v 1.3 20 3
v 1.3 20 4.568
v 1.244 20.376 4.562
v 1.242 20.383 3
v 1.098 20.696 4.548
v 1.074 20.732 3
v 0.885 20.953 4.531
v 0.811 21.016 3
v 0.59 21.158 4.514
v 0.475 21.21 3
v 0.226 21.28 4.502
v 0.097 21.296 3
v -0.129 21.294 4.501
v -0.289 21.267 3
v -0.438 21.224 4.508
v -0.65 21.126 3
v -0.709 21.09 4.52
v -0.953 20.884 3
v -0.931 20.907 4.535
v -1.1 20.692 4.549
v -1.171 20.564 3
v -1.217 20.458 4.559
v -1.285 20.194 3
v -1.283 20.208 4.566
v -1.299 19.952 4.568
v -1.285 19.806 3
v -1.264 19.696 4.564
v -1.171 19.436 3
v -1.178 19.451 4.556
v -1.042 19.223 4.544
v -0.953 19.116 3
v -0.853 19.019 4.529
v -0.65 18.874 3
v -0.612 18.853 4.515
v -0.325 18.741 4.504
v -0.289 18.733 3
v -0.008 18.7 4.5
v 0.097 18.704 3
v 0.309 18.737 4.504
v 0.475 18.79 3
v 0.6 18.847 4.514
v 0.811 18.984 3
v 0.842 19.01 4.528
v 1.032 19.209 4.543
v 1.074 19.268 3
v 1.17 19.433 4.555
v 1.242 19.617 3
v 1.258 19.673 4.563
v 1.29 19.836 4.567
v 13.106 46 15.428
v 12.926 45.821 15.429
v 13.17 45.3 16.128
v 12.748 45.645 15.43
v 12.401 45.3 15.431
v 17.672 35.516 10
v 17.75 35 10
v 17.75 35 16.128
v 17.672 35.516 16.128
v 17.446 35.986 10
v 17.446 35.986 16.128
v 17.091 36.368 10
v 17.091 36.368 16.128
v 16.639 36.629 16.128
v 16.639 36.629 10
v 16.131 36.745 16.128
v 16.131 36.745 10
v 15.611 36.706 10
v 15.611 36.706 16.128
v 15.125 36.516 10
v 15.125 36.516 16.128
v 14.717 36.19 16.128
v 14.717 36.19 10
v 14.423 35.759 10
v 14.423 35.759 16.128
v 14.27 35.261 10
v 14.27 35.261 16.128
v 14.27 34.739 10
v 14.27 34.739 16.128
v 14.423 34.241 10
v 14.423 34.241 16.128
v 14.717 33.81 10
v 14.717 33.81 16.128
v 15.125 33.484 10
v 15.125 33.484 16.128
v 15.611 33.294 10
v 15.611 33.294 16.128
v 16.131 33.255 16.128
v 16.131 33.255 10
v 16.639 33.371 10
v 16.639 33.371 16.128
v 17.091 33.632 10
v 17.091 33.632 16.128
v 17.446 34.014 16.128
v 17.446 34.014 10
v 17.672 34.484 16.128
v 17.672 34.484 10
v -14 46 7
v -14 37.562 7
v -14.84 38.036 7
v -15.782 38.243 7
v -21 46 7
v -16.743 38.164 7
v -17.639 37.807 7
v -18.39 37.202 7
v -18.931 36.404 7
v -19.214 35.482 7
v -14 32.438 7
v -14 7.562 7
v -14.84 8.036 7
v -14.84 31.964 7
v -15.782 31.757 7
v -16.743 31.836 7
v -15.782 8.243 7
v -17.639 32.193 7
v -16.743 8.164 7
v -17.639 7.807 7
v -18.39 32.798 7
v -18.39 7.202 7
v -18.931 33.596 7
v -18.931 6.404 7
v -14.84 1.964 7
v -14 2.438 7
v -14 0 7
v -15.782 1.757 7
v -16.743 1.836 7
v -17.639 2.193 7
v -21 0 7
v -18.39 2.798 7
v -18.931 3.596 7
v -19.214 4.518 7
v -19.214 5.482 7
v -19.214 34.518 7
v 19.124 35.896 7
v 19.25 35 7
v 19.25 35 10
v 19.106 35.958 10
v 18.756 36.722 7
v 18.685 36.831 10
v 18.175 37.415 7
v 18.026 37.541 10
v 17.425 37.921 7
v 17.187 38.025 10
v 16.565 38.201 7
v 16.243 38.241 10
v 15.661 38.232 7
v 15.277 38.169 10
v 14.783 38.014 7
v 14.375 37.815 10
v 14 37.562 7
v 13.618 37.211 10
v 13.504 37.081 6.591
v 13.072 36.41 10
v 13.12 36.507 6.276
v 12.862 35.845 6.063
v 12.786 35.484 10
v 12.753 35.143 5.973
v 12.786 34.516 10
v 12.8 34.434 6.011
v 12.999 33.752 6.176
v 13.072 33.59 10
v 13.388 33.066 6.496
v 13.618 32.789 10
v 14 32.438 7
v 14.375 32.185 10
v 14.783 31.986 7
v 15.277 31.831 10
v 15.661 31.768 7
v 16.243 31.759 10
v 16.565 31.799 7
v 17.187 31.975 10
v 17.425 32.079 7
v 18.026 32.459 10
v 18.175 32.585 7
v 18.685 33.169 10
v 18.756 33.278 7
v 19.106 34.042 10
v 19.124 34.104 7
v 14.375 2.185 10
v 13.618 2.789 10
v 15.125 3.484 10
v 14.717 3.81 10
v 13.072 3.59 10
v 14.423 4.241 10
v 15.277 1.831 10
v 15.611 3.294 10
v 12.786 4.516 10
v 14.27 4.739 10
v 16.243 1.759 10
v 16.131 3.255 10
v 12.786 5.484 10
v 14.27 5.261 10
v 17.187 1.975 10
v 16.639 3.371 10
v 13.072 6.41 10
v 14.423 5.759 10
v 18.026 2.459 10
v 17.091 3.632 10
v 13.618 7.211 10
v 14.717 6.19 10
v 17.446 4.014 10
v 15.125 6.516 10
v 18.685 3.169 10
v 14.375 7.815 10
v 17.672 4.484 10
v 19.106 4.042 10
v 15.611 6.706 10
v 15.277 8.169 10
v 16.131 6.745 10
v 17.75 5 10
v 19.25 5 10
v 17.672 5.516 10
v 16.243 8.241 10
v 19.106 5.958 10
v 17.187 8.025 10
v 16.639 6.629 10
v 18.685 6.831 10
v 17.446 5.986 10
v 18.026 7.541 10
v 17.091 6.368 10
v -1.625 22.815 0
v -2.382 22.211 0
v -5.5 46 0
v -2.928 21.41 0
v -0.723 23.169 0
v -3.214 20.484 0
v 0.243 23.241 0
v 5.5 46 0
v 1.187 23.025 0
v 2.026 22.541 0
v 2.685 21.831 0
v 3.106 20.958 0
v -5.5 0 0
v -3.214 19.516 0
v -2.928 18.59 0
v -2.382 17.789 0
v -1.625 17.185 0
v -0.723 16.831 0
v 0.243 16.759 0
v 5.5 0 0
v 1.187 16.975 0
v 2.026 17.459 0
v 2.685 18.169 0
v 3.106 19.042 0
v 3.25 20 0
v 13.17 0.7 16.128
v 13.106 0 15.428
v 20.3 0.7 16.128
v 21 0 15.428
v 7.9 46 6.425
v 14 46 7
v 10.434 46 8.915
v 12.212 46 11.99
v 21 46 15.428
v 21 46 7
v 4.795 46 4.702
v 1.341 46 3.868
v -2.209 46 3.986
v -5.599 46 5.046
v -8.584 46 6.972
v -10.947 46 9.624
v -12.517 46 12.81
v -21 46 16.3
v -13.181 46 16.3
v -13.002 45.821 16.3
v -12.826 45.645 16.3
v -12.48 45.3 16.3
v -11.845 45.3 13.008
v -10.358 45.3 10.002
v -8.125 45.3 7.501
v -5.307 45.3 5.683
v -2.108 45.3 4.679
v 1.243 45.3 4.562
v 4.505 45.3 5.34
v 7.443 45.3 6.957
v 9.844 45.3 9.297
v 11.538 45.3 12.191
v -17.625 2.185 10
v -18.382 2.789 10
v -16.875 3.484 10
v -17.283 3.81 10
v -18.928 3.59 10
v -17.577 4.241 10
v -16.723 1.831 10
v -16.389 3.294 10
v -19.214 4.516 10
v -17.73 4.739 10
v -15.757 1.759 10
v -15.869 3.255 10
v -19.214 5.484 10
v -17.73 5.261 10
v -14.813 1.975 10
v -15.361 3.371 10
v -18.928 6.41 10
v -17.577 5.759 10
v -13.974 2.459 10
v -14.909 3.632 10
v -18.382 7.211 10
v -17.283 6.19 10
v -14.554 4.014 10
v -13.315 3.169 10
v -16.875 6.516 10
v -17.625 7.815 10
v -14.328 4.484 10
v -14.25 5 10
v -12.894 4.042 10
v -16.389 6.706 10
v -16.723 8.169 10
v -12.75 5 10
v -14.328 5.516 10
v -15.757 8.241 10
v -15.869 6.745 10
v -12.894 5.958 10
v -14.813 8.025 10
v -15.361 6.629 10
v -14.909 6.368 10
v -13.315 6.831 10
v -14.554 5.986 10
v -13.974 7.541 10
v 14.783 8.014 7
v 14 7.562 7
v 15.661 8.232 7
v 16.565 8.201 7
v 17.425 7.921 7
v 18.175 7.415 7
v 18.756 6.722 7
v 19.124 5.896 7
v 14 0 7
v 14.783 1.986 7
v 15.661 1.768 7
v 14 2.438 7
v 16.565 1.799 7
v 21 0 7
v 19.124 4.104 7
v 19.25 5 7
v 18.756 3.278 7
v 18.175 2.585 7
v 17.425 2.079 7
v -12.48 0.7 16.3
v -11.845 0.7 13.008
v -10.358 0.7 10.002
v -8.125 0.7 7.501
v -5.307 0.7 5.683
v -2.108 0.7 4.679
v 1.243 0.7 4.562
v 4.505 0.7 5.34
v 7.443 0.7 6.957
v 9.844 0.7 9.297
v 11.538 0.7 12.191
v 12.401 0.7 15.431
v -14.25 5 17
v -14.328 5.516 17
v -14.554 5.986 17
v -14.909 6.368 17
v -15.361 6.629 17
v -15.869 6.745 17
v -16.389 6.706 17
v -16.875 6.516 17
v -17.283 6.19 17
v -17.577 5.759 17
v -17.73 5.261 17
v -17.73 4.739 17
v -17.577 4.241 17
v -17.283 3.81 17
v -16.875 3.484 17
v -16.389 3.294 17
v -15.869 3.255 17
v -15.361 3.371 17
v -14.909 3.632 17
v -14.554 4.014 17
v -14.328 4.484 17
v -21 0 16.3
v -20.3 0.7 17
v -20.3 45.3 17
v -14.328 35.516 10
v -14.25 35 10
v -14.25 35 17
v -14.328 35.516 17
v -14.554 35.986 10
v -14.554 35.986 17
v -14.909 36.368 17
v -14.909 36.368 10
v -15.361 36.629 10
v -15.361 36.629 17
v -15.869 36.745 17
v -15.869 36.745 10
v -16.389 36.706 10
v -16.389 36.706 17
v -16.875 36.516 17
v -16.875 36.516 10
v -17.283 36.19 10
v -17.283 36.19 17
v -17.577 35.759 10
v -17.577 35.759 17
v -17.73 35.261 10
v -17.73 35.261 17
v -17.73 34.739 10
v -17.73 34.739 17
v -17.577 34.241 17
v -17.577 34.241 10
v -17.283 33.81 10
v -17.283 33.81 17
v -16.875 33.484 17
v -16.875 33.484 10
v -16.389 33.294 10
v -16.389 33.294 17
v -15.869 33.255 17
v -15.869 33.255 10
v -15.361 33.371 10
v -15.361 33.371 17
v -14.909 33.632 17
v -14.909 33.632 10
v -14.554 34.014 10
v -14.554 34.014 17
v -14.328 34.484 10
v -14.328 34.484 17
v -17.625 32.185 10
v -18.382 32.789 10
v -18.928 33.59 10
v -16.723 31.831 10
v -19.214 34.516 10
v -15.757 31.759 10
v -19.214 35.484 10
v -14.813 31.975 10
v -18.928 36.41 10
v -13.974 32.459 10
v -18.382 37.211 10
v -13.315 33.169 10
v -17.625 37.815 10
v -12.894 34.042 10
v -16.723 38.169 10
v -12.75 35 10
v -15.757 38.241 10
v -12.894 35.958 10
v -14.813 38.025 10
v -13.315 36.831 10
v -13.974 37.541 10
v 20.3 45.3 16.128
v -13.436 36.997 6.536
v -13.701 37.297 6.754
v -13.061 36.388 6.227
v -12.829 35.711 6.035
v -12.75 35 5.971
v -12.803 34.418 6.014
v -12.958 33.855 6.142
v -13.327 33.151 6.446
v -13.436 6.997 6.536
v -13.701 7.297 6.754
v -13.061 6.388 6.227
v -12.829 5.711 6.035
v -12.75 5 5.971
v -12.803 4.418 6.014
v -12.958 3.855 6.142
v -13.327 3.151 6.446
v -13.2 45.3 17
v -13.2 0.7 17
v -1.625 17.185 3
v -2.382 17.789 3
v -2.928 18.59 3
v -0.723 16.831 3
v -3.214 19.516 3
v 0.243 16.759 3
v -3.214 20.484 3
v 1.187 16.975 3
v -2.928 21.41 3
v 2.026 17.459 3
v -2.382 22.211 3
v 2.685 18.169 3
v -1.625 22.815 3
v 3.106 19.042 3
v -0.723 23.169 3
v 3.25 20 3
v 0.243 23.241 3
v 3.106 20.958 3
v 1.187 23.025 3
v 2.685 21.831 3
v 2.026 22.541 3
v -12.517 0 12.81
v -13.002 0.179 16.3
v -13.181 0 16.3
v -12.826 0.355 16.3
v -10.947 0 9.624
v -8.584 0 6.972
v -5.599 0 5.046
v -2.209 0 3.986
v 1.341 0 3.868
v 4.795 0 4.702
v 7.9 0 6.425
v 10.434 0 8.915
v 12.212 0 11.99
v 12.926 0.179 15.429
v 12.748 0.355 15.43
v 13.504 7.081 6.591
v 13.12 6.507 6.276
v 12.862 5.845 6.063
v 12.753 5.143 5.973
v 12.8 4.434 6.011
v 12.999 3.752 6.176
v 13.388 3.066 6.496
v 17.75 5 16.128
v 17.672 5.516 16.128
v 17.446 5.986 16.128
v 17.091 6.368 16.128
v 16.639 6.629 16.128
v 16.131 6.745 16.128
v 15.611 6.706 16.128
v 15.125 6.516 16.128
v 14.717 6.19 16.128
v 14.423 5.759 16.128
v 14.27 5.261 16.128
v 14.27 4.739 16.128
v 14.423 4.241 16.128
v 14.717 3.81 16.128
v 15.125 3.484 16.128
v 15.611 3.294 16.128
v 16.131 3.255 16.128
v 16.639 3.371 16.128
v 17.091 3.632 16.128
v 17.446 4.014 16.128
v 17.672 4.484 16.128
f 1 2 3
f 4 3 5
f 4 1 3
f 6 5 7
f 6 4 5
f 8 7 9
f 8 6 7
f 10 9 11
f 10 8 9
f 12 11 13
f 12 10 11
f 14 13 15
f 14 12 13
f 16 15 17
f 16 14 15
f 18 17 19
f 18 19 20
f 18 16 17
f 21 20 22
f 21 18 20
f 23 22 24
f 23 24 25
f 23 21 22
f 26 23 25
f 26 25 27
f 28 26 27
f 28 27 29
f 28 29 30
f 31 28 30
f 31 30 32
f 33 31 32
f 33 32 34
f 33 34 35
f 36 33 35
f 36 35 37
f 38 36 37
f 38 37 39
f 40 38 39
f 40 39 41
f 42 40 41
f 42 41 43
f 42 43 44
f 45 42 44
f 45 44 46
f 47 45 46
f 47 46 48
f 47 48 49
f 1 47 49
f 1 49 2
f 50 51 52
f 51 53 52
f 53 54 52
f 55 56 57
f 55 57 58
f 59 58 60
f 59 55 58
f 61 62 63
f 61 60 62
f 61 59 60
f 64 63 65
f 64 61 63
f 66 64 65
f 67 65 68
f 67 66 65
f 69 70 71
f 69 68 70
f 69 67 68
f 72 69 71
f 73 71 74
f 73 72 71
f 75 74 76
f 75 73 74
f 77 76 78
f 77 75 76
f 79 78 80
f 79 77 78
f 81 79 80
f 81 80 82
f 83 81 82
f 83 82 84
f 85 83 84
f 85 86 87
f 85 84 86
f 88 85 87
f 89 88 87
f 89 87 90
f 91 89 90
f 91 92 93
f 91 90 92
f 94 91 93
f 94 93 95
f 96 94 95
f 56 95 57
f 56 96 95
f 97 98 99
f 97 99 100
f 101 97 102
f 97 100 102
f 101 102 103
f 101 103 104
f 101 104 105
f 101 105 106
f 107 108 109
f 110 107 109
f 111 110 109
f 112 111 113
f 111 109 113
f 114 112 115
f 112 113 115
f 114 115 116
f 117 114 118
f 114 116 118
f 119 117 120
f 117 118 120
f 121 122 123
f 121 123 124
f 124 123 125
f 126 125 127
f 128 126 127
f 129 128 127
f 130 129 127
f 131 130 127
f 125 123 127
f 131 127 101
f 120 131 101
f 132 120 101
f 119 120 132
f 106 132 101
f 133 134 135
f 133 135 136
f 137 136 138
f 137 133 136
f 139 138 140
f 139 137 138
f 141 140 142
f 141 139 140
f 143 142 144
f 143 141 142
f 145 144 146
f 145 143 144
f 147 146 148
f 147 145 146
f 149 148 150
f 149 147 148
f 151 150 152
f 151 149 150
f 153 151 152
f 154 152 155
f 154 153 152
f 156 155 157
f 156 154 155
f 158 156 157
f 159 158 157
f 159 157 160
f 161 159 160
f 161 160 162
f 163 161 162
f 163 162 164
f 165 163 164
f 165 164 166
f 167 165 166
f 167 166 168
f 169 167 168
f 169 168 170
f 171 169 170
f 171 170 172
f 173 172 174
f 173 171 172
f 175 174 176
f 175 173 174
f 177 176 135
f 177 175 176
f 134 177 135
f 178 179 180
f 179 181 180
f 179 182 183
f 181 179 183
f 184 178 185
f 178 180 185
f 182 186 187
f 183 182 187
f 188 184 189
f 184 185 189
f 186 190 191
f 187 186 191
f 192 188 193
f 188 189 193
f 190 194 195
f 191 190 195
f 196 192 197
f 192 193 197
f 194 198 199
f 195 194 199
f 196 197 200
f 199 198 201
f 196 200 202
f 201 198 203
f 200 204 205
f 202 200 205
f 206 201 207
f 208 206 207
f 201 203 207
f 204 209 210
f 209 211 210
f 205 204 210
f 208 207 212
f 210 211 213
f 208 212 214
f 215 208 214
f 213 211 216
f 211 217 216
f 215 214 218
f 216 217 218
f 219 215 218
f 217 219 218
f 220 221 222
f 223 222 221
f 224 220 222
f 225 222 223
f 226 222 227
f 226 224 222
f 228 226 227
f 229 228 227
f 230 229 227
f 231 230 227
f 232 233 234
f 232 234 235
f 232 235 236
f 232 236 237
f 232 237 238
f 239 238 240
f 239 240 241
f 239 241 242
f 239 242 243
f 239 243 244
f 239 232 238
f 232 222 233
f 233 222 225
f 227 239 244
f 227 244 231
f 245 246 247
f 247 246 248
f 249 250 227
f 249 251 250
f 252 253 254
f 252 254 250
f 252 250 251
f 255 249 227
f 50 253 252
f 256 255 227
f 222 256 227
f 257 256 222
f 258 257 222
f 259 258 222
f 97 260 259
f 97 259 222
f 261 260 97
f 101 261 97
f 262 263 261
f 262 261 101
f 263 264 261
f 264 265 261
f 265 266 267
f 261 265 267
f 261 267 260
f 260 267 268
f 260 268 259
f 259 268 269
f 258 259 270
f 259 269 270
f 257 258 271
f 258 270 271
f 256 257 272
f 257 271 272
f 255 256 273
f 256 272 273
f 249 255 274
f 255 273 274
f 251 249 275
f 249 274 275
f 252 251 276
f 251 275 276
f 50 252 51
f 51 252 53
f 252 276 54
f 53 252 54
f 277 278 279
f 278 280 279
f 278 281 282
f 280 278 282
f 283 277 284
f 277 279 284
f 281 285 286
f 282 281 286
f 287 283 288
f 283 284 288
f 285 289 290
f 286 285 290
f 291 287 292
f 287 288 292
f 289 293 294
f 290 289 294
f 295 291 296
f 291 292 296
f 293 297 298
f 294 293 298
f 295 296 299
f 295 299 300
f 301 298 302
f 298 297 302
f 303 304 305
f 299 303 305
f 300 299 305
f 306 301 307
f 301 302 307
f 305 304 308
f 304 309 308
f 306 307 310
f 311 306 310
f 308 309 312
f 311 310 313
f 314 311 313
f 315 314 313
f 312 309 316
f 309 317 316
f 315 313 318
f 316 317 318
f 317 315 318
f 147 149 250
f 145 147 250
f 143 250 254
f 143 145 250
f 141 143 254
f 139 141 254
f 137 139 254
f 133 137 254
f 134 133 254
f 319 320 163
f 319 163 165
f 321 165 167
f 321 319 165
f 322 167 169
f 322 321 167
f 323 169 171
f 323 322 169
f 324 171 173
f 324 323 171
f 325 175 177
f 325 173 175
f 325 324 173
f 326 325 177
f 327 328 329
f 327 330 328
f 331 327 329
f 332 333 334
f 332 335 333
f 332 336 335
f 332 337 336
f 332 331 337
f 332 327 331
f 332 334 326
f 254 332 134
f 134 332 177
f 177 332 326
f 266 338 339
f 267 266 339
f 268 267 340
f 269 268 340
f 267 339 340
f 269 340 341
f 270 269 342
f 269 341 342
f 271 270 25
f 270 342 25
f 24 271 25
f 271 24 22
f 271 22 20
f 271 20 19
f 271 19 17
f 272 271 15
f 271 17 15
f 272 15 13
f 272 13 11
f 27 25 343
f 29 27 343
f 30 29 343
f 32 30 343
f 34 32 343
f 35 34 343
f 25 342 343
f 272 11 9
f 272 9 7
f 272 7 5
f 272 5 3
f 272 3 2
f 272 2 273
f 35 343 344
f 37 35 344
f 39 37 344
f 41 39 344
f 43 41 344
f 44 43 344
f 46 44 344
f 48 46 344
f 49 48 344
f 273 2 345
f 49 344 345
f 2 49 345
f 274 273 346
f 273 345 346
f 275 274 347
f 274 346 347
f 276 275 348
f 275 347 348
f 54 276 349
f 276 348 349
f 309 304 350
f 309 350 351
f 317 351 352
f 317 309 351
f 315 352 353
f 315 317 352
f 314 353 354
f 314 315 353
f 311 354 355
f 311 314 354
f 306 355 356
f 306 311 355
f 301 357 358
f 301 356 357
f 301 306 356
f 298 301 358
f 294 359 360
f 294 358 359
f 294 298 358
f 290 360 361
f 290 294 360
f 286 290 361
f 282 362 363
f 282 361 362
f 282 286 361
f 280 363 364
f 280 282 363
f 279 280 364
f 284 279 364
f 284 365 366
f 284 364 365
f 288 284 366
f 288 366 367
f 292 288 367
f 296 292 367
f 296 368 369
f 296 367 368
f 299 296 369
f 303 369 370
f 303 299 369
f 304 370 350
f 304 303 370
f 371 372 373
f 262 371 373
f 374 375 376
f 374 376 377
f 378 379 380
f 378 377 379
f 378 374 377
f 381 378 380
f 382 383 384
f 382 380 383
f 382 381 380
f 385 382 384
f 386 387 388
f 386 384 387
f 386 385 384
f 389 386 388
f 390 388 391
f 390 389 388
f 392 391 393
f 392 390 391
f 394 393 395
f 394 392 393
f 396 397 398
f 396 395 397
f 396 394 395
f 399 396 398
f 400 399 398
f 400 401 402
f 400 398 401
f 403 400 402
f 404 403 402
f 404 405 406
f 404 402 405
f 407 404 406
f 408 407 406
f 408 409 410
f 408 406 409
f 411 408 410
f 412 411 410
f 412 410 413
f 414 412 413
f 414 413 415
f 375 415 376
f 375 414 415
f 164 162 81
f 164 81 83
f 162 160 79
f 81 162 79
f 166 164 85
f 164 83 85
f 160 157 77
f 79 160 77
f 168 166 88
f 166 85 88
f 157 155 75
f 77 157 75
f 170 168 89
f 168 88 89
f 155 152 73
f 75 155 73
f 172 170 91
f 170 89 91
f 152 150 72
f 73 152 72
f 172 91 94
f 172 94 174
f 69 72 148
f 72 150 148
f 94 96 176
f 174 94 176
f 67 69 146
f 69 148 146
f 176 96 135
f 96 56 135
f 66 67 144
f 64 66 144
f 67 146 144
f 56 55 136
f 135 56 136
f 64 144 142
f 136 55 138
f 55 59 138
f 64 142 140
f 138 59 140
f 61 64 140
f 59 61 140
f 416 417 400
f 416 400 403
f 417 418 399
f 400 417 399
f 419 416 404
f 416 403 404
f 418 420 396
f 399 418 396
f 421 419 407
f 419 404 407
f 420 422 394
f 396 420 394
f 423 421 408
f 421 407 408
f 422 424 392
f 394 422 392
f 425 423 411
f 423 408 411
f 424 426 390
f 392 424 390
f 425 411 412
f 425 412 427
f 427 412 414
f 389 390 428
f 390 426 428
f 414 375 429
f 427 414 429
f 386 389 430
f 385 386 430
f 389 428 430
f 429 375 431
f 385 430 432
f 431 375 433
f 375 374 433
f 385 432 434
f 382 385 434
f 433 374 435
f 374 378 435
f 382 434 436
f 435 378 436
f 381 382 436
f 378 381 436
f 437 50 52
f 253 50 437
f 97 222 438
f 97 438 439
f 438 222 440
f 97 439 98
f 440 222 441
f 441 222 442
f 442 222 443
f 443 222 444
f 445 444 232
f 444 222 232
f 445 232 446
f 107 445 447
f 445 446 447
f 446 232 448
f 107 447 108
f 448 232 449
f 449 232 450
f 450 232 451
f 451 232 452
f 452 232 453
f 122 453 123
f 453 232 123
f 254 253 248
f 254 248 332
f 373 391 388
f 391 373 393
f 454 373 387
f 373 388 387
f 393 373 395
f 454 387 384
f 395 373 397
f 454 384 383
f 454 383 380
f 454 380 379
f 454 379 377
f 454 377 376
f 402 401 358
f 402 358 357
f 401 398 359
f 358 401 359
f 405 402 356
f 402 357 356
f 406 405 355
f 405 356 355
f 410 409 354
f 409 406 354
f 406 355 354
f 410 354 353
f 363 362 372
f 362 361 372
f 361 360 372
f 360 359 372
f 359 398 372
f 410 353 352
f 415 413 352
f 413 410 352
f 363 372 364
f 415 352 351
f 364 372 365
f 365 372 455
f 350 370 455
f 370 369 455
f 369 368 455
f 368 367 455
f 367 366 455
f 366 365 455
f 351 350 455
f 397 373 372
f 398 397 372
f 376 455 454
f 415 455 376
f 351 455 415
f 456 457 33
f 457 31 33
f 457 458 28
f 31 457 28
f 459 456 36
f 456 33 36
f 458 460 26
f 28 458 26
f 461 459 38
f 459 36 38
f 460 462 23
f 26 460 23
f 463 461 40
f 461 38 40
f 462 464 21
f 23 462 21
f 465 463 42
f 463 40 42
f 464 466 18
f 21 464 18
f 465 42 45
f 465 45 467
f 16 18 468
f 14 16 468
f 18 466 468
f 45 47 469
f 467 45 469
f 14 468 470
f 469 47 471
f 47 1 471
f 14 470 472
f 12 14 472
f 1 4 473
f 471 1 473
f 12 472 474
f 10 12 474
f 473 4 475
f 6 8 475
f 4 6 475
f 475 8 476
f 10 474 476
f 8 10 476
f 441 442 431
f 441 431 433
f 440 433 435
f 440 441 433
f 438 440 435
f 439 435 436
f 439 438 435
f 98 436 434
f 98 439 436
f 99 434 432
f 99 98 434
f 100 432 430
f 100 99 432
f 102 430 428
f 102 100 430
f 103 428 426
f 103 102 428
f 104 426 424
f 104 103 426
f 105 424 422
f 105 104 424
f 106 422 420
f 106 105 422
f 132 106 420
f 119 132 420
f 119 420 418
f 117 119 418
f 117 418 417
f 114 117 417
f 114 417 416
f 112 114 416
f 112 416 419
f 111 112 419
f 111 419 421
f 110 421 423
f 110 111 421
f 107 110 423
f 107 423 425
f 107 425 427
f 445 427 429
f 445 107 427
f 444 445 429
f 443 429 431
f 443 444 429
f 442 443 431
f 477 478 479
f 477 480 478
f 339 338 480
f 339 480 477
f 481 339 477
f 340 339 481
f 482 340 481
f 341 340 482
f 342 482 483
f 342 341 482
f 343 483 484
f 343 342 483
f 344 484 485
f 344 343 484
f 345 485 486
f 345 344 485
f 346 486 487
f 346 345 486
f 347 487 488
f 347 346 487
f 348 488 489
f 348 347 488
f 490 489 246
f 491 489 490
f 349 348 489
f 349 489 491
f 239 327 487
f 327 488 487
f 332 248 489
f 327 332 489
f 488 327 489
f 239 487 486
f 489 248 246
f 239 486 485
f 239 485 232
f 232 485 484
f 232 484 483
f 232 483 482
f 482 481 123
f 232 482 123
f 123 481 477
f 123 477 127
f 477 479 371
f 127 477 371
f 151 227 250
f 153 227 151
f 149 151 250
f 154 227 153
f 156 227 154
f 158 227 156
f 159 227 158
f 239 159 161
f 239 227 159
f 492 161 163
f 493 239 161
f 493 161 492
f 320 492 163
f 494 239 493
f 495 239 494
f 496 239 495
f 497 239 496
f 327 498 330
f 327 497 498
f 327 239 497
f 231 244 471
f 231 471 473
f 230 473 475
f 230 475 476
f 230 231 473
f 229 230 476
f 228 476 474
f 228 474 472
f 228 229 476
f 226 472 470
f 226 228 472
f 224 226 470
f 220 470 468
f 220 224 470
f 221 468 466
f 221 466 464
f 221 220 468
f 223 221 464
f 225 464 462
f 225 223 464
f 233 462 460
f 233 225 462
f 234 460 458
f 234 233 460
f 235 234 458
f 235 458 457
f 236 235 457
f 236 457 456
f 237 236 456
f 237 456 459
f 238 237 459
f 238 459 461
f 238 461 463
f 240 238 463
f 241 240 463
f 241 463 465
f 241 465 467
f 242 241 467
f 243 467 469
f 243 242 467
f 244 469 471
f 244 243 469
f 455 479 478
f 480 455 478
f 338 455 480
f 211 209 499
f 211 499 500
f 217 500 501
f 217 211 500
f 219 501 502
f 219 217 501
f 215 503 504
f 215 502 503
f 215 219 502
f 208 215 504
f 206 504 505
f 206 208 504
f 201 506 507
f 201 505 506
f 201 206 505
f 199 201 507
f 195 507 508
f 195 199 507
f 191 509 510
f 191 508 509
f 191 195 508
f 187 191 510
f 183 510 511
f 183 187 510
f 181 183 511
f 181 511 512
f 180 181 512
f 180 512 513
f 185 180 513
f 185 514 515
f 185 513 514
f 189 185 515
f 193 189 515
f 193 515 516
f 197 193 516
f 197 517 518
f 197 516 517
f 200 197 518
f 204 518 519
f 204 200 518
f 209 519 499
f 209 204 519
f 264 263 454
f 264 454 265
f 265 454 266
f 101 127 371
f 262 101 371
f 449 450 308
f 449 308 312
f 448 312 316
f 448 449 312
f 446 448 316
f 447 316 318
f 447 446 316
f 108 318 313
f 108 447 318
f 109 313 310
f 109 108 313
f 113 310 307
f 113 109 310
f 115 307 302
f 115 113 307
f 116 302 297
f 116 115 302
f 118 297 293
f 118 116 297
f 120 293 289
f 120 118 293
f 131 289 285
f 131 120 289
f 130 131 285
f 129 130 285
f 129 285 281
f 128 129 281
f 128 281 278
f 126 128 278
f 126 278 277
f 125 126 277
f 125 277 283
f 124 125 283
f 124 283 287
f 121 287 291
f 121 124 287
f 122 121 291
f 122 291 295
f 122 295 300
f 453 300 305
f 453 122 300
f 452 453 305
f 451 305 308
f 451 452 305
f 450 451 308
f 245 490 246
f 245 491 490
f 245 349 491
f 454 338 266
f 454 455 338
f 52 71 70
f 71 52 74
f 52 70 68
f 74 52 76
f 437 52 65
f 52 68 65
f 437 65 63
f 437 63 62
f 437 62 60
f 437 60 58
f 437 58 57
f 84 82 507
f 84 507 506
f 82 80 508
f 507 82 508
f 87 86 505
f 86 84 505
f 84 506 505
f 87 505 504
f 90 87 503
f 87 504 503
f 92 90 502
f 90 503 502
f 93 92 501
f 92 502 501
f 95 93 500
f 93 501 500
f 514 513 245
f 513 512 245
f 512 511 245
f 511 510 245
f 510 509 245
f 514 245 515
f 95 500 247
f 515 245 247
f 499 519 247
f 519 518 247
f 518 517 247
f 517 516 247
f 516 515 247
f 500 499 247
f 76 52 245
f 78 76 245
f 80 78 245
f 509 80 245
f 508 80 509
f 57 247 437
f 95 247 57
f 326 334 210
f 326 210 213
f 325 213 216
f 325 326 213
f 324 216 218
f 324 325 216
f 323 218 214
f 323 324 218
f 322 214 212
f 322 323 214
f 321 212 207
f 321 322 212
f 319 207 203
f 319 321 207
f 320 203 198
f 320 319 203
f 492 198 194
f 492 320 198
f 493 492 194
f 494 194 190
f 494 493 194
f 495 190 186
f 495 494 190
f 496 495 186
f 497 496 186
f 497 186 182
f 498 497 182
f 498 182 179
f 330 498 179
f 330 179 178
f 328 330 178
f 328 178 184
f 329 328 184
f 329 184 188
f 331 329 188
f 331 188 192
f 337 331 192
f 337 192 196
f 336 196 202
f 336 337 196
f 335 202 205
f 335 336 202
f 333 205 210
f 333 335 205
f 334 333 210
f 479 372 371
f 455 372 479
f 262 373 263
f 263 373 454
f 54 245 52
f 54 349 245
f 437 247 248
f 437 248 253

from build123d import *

# Parameters (mm, degrees)
SKETCH009_R                       = 3.25
EXTRUDE003_DEPTH                  = 3
SKETCH008_R                       = 3.25
EXTRUDE002_DEPTH                  = 10
SKETCH007_R                       = 1.75
SKETCH007_R_2                     = 1.3
EXTRUDE001_DEPTH                  = 25
EXTRUDE_DEPTH                     = 46
EXTRUDE_ONTO_SKETCH003_ROLL_ANGLE = 90
CHAMFER_SIZE                      = 0.7


with BuildPart() as extrude003:
    # Sketch009 → Extrude003 (new body)
    with BuildSketch(Plane.XY):
        with Locations((0, 20)):
            Circle(SKETCH009_R)
    extrude(amount=EXTRUDE003_DEPTH)


with BuildPart() as extrude002:
    # Sketch008 → Extrude002 (new body)
    with BuildSketch(Plane.XY):
        with Locations((-16, 5)):
            Circle(SKETCH008_R)
        with Locations((16, 5)):
            Circle(SKETCH008_R)
        with Locations((-16, 35)):
            Circle(SKETCH008_R)
        with Locations((16, 35)):
            Circle(SKETCH008_R)
    extrude(amount=EXTRUDE002_DEPTH)


with BuildPart() as extrude001:
    # Sketch007 → Extrude001 (new body)
    with BuildSketch(Plane.XY):
        with Locations((-16, 5)):
            Circle(SKETCH007_R)
        with Locations((16, 5)):
            Circle(SKETCH007_R)
        with Locations((-16, 35)):
            Circle(SKETCH007_R)
        with Locations((16, 35)):
            Circle(SKETCH007_R)
        with Locations((0, 20)):
            Circle(SKETCH007_R_2)
    extrude(amount=EXTRUDE001_DEPTH)


with BuildPart() as chamfer_body:
    # Sketch003 as drawn → Extrude (new)
    with BuildSketch(Plane.XY):
        with BuildLine():
            Line((21, 16.128044), (21, 7))
            Line((14, 7), (21, 7))
            Line((5.5, 0), (14, 7))
            Line((-5.5, 0), (5.5, 0))
            Line((-5.5, 0), (-14, 7))
            Line((-14, 7), (-21, 7))
            Line((-21, 7), (-21, 17))
            Line((-21, 17), (-12.5, 17))
            ThreePointArc((-12.5, 17), (-0.436244, 4.507615), (12.469551, 16.128044))
            Line((12.469551, 16.128044), (21, 16.128044))
        make_face()
    extrude(amount=-EXTRUDE_DEPTH)


with BuildPart() as chamfer_body_1:
    # Extrude onto Sketch003 roll: moved
    add(chamfer_body.part.rotate(Axis((0, 0, 0), (1, 0, 0)), EXTRUDE_ONTO_SKETCH003_ROLL_ANGLE))


with BuildPart() as chamfer_body_2:
    # Extrude onto Sketch003 placement: moved
    add(chamfer_body_1.part)

    # Cut: cut Extrude001
    add(extrude001.part, mode=Mode.SUBTRACT)

    # Cut001: cut Extrude002
    add(extrude002.part, mode=Mode.SUBTRACT)

    # Cut002: cut Extrude003
    add(extrude003.part, mode=Mode.SUBTRACT)

    # Chamfer
    chamfer_edges = [chamfer_body_2.edges().sort_by_distance(p)[0] for p in [
        (-16.75, 0, 17),
        (-0.436244, 0, 4.507615),
        (16.734775, 0, 16.128044),
        (-16.75, 46, 17),
        (-0.436244, 46, 4.507615),
        (16.734775, 46, 16.128044),
        (-21, 23, 17),
        (-12.5, 23, 17),
        (12.469551, 23, 16.128044),
        (21, 23, 16.128044),
    ]]
    chamfer(chamfer_edges, length=CHAMFER_SIZE)


solid = chamfer_body_2.part
